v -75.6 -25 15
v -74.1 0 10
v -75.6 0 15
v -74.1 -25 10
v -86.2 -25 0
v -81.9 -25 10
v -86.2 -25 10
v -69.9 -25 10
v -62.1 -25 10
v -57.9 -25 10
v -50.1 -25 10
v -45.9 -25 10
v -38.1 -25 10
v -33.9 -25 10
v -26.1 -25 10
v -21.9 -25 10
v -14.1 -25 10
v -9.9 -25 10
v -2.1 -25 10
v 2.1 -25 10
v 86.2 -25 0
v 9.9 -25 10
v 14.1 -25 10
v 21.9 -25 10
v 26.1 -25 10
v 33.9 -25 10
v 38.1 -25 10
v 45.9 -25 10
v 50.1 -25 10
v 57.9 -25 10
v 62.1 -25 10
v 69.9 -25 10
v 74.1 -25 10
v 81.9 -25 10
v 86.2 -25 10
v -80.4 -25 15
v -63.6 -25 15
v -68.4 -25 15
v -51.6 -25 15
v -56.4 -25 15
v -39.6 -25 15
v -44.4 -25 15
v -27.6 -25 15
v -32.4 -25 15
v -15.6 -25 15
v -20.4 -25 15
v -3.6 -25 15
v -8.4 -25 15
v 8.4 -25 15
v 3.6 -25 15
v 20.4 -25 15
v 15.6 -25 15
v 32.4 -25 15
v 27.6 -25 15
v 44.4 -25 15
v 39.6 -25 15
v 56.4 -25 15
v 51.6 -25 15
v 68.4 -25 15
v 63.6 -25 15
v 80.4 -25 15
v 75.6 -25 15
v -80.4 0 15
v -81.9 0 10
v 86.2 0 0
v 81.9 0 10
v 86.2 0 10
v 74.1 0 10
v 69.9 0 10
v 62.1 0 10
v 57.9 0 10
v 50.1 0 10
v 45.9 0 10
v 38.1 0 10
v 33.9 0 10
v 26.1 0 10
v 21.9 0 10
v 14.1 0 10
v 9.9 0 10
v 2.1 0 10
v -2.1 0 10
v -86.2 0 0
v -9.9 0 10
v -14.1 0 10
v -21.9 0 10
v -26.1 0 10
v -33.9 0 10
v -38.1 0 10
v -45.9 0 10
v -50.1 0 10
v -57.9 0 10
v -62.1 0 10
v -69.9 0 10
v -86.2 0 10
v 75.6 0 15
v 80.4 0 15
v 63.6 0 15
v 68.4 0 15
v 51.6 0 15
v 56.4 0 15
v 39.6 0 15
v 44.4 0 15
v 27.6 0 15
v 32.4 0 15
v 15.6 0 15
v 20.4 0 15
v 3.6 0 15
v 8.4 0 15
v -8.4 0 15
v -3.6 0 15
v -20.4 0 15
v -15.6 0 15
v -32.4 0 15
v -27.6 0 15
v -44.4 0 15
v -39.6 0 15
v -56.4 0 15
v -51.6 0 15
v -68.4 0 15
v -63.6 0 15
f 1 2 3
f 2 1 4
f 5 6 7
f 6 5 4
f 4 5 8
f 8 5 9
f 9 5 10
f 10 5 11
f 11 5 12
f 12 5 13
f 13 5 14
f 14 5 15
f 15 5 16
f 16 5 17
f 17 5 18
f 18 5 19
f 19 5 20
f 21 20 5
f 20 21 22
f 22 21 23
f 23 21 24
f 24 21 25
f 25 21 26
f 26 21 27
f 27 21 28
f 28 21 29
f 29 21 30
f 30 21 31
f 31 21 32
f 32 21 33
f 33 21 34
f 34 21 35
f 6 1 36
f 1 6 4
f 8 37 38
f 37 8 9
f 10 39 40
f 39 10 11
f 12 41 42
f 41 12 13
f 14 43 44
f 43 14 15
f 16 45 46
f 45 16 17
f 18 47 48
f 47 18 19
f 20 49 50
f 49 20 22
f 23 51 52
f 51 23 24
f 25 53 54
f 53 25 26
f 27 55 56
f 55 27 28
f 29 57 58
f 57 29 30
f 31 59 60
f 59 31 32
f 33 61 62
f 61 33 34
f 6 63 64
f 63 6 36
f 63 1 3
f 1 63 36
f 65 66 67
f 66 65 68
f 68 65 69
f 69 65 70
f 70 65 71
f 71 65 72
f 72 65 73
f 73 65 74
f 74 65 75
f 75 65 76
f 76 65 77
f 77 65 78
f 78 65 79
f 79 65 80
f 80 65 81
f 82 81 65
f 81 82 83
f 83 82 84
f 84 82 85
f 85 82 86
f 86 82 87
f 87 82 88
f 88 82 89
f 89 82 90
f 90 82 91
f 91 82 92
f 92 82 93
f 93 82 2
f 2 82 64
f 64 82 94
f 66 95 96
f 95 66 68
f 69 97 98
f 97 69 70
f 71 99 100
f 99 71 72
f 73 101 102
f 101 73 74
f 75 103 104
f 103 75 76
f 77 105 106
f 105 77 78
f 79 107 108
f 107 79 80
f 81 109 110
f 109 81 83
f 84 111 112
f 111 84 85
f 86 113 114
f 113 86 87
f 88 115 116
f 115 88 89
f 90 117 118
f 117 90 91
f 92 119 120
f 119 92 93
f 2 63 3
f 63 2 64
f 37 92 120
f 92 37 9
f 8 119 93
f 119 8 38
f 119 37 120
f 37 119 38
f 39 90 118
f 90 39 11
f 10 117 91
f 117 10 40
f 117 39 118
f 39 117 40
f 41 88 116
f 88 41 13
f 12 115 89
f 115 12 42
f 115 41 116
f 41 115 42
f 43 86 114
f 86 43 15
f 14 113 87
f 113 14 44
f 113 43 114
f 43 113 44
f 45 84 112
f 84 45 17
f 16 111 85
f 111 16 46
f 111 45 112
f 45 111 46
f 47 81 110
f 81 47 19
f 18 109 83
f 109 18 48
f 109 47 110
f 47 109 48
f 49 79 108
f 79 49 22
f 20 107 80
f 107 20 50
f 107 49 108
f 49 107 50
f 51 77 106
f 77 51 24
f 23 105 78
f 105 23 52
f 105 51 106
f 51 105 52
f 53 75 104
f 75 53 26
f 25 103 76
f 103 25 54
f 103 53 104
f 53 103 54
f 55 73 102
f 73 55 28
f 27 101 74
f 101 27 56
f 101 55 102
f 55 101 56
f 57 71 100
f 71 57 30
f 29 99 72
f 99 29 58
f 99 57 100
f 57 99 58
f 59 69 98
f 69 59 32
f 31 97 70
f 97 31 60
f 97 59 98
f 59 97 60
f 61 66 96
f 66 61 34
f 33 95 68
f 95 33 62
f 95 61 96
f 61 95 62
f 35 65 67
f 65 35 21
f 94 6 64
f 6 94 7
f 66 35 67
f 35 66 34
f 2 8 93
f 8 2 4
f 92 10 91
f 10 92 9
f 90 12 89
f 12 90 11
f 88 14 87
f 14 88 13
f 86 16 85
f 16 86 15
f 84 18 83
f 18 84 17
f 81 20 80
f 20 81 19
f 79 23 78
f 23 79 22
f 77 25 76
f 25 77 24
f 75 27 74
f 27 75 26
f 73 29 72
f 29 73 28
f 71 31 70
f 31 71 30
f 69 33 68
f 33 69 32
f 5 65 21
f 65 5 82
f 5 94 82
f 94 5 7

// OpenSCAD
$fn = 32;

// ----------------------------------------------------------------------
// Toothed rack, 14 teeth
// 12 mm pitch, 5 mm teeth
// ----------------------------------------------------------------------

// --- parameters (mm) ---
bar_w = 25;     // bar width (Y)
bar_h = 10;     // bar height (Z)
teeth = 14;     // number of teeth
pitch = 12;     // tooth pitch
tooth_h = 5;    // tooth height above the bar
root_w = 8.4;   // tooth width at the root
crest_w = 4.8;  // tooth width at the crest

// --- derived feature positions (mm) ---
span = (teeth - 1) * pitch;  // = 156   distance between the outer teeth
bar_l = span + root_w + 8;   // = 172.4   bar length: teeth plus 4 mm at each end
tooth_x = -span / 2;         // = -78   X of the first tooth
height = bar_h + tooth_h;    // = 15   overall height
feature_centers = [
  [tooth_x + 0 * pitch, -bar_w / 2],
  [tooth_x + 1 * pitch, -bar_w / 2],
  [tooth_x + 2 * pitch, -bar_w / 2],
  [tooth_x + 3 * pitch, -bar_w / 2],
  [tooth_x + 4 * pitch, -bar_w / 2],
  [tooth_x + 5 * pitch, -bar_w / 2],
  [tooth_x + 6 * pitch, -bar_w / 2],
  [tooth_x + 7 * pitch, -bar_w / 2],
  [tooth_x + 8 * pitch, -bar_w / 2],
  [tooth_x + 9 * pitch, -bar_w / 2],
  [tooth_x + 10 * pitch, -bar_w / 2],
  [tooth_x + 11 * pitch, -bar_w / 2],
  [tooth_x + 12 * pitch, -bar_w / 2],
  [tooth_x + 13 * pitch, -bar_w / 2]
];   // tooth centre line, drives the tooth loop

// bar with a rack of teeth, one extruded trapezoium per centre
module rack_tooth() {
  linear_extrude(height = bar_w)
    polygon(points = [
      [0, 0],
      [root_w, 0],
      [root_w / 2 + crest_w / 2, tooth_h + 1],
      [root_w / 2 - crest_w / 2, tooth_h + 1]
    ]);
}

union() {
  translate([-bar_l / 2, -bar_w, 0]) cube([bar_l, bar_w, bar_h]);
  for (centre = feature_centers)
    translate([centre[0] - root_w / 2, 0, bar_h - 1]) rotate([90, 0, 0]) rack_tooth();
}
